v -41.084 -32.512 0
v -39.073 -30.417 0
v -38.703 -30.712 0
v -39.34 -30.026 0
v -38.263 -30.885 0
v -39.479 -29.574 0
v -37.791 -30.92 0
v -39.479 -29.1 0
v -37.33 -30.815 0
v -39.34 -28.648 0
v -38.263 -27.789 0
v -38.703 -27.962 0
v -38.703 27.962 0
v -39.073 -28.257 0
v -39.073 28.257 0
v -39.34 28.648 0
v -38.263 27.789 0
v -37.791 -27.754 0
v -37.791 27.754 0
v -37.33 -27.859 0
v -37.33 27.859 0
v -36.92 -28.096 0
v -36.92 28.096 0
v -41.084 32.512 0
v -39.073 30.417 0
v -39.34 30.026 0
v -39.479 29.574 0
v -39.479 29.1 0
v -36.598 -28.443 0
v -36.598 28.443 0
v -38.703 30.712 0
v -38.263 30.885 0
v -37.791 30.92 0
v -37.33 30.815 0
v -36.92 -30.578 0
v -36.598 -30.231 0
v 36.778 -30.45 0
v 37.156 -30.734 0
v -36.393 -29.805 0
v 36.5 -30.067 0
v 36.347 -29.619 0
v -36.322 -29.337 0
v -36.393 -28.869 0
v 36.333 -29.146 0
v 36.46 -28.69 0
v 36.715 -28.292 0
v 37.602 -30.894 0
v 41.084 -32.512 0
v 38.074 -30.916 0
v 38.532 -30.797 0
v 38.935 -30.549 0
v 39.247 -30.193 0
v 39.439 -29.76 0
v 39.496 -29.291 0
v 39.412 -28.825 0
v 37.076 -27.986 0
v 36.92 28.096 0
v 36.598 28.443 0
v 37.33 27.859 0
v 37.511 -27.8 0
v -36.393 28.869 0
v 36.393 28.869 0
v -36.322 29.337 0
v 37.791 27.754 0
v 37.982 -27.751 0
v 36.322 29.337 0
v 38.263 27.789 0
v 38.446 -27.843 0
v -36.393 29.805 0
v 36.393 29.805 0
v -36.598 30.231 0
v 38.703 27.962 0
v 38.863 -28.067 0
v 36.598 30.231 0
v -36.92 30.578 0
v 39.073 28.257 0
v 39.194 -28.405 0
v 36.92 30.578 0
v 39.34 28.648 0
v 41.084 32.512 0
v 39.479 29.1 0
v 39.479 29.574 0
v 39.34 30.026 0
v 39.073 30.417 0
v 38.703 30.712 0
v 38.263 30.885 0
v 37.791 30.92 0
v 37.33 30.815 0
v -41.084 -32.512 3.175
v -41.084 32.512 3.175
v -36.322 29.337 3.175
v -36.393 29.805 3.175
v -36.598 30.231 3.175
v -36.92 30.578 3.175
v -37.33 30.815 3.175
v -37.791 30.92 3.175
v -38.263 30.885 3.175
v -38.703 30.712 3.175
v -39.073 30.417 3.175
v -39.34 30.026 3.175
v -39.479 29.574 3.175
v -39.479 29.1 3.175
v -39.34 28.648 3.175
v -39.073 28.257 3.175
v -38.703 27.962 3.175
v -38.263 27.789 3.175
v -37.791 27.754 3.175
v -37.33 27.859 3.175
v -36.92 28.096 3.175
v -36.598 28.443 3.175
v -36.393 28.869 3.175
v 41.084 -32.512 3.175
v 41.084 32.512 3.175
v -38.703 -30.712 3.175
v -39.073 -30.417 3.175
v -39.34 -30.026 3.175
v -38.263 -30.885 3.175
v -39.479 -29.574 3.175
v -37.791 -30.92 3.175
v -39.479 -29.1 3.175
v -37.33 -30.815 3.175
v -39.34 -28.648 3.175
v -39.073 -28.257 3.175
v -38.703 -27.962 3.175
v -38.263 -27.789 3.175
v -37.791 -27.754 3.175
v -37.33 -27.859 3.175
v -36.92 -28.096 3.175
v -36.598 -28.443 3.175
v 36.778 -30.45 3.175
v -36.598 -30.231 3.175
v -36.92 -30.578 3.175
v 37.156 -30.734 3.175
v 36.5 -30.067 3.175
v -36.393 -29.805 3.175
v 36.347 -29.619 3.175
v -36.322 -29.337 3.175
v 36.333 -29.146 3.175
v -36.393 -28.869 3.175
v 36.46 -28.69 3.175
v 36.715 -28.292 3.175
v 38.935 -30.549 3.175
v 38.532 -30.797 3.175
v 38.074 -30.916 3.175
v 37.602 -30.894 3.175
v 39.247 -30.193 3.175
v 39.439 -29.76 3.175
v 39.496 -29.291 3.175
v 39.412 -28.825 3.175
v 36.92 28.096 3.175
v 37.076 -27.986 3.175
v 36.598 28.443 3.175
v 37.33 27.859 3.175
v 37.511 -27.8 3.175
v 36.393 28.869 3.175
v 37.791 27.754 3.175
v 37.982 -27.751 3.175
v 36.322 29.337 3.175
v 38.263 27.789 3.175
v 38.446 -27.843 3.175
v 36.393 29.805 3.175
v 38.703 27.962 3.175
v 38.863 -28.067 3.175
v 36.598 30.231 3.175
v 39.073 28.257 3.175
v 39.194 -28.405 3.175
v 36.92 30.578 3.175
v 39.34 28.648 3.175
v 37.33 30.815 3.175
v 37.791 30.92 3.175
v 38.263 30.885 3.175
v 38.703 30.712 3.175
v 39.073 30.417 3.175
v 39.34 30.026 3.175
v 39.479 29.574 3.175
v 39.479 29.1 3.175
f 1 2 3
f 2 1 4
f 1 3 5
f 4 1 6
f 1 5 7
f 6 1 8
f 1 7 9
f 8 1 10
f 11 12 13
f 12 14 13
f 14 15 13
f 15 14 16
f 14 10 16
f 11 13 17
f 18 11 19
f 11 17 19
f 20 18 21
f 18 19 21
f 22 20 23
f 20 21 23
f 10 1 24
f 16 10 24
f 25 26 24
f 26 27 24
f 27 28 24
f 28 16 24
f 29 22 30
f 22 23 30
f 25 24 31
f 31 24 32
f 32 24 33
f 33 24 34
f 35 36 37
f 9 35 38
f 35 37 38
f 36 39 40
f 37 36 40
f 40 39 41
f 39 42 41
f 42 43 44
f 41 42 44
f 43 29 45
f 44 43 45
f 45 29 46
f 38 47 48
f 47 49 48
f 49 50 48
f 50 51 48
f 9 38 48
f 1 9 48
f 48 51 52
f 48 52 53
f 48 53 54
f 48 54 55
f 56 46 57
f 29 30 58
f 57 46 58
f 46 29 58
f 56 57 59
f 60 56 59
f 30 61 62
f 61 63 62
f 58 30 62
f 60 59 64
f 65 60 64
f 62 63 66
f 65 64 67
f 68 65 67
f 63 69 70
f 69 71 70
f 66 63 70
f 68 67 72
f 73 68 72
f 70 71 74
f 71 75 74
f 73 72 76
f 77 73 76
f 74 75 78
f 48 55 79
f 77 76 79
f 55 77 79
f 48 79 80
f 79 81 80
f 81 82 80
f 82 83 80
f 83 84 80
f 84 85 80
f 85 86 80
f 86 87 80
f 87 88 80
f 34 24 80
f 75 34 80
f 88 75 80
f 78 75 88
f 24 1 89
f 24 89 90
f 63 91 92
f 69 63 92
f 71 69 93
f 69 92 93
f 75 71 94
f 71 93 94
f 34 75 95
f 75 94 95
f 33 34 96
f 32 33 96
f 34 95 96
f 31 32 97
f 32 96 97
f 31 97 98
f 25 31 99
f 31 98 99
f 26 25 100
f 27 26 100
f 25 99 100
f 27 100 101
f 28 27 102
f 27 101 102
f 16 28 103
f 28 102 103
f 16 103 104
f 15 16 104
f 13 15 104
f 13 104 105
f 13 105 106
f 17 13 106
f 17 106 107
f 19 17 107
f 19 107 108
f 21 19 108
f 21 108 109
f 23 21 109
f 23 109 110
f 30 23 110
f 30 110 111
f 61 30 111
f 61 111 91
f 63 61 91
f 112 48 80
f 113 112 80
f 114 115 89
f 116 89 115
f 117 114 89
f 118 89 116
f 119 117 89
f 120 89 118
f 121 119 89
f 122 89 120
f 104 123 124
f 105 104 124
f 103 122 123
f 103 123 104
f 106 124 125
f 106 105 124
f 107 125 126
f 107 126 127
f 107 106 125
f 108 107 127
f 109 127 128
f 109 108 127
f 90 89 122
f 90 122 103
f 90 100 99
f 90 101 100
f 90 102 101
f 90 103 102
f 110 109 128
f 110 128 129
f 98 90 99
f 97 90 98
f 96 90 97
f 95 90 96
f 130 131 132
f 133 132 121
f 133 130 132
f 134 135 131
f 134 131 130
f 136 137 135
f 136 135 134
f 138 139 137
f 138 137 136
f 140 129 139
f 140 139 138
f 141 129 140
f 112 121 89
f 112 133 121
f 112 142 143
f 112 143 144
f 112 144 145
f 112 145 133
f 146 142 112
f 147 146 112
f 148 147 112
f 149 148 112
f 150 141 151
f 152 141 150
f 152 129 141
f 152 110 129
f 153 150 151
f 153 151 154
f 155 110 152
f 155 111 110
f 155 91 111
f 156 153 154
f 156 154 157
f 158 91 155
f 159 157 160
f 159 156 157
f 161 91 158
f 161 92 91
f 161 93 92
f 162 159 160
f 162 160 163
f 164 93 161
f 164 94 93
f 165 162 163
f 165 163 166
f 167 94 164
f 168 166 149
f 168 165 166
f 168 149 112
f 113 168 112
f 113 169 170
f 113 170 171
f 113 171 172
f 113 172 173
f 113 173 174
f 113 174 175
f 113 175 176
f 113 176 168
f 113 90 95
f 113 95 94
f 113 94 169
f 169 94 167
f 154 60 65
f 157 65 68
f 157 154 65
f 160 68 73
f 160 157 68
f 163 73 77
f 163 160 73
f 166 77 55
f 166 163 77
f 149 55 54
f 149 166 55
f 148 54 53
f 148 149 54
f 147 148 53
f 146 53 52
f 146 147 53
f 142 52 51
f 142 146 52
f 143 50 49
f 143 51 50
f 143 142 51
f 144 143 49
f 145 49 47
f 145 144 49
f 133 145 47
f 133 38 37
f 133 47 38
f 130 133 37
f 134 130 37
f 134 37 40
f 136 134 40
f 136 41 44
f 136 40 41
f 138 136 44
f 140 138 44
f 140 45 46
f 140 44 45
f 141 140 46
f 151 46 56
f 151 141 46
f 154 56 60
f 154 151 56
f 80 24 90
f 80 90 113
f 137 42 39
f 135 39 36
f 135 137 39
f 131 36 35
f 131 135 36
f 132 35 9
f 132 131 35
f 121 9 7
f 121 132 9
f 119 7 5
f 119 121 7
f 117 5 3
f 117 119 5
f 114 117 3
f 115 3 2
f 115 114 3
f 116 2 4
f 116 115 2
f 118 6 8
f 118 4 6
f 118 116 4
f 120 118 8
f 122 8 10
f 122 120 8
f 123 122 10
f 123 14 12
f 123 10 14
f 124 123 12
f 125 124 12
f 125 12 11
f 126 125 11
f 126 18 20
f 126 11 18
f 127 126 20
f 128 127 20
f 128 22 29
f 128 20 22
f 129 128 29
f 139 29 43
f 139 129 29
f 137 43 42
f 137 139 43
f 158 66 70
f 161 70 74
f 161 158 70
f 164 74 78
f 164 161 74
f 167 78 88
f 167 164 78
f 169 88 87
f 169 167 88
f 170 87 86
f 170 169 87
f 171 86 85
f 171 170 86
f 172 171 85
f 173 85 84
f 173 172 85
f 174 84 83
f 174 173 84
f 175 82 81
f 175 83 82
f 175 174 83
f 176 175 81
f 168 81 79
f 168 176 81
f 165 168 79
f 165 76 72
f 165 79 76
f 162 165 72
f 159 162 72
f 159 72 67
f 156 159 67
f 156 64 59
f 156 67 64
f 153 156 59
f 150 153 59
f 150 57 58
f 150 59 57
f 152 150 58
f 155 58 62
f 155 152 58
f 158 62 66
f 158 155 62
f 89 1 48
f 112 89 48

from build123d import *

# Parameters (mm, degrees)
F0_W     = 82.169
F0_H     = 65.024
F1_DEPTH = 3.175
F2_R     = 1.5875
F3_DEPTH = 25.4


# Not quite as in the source:
# - a pattern or mirror of a feature is missing from the dataset's text; its kind, count and spacing are read off the source's solid


with BuildPart() as f1:
    # F0 (on Top) → F1 (new body)
    with BuildSketch(Plane.XY):
        Rectangle(F0_W, F0_H)
    extrude(amount=F1_DEPTH)

    # F2 (on face) → F3 (cut)
    with BuildSketch(Plane.XY.offset(3.175)):
        with Locations((-37.9095, 29.337)):
            Circle(F2_R)
    f3 = extrude(amount=-F3_DEPTH, mode=Mode.SUBTRACT)

    # F3_copies: F3 across plane
    add(f3.mirror(Plane(origin=(0, 0, 0), x_dir=(0, 0, 1), z_dir=(1, 0, 0))), mode=Mode.SUBTRACT)

    # F3_copies1: F3 across plane
    add(f3.mirror(Plane(origin=(0, 0, 0), x_dir=(0, 0, -1), z_dir=(0, -1, 0))), mode=Mode.SUBTRACT)

    # F3_copies2: F3 across plane
    add(f3.mirror(Plane(origin=(0, 0, 0), x_dir=(0.6120128715, 0.7908478015, 0), z_dir=(0.7908478015, -0.6120128715, 0))), mode=Mode.SUBTRACT)


solid = f1.part
